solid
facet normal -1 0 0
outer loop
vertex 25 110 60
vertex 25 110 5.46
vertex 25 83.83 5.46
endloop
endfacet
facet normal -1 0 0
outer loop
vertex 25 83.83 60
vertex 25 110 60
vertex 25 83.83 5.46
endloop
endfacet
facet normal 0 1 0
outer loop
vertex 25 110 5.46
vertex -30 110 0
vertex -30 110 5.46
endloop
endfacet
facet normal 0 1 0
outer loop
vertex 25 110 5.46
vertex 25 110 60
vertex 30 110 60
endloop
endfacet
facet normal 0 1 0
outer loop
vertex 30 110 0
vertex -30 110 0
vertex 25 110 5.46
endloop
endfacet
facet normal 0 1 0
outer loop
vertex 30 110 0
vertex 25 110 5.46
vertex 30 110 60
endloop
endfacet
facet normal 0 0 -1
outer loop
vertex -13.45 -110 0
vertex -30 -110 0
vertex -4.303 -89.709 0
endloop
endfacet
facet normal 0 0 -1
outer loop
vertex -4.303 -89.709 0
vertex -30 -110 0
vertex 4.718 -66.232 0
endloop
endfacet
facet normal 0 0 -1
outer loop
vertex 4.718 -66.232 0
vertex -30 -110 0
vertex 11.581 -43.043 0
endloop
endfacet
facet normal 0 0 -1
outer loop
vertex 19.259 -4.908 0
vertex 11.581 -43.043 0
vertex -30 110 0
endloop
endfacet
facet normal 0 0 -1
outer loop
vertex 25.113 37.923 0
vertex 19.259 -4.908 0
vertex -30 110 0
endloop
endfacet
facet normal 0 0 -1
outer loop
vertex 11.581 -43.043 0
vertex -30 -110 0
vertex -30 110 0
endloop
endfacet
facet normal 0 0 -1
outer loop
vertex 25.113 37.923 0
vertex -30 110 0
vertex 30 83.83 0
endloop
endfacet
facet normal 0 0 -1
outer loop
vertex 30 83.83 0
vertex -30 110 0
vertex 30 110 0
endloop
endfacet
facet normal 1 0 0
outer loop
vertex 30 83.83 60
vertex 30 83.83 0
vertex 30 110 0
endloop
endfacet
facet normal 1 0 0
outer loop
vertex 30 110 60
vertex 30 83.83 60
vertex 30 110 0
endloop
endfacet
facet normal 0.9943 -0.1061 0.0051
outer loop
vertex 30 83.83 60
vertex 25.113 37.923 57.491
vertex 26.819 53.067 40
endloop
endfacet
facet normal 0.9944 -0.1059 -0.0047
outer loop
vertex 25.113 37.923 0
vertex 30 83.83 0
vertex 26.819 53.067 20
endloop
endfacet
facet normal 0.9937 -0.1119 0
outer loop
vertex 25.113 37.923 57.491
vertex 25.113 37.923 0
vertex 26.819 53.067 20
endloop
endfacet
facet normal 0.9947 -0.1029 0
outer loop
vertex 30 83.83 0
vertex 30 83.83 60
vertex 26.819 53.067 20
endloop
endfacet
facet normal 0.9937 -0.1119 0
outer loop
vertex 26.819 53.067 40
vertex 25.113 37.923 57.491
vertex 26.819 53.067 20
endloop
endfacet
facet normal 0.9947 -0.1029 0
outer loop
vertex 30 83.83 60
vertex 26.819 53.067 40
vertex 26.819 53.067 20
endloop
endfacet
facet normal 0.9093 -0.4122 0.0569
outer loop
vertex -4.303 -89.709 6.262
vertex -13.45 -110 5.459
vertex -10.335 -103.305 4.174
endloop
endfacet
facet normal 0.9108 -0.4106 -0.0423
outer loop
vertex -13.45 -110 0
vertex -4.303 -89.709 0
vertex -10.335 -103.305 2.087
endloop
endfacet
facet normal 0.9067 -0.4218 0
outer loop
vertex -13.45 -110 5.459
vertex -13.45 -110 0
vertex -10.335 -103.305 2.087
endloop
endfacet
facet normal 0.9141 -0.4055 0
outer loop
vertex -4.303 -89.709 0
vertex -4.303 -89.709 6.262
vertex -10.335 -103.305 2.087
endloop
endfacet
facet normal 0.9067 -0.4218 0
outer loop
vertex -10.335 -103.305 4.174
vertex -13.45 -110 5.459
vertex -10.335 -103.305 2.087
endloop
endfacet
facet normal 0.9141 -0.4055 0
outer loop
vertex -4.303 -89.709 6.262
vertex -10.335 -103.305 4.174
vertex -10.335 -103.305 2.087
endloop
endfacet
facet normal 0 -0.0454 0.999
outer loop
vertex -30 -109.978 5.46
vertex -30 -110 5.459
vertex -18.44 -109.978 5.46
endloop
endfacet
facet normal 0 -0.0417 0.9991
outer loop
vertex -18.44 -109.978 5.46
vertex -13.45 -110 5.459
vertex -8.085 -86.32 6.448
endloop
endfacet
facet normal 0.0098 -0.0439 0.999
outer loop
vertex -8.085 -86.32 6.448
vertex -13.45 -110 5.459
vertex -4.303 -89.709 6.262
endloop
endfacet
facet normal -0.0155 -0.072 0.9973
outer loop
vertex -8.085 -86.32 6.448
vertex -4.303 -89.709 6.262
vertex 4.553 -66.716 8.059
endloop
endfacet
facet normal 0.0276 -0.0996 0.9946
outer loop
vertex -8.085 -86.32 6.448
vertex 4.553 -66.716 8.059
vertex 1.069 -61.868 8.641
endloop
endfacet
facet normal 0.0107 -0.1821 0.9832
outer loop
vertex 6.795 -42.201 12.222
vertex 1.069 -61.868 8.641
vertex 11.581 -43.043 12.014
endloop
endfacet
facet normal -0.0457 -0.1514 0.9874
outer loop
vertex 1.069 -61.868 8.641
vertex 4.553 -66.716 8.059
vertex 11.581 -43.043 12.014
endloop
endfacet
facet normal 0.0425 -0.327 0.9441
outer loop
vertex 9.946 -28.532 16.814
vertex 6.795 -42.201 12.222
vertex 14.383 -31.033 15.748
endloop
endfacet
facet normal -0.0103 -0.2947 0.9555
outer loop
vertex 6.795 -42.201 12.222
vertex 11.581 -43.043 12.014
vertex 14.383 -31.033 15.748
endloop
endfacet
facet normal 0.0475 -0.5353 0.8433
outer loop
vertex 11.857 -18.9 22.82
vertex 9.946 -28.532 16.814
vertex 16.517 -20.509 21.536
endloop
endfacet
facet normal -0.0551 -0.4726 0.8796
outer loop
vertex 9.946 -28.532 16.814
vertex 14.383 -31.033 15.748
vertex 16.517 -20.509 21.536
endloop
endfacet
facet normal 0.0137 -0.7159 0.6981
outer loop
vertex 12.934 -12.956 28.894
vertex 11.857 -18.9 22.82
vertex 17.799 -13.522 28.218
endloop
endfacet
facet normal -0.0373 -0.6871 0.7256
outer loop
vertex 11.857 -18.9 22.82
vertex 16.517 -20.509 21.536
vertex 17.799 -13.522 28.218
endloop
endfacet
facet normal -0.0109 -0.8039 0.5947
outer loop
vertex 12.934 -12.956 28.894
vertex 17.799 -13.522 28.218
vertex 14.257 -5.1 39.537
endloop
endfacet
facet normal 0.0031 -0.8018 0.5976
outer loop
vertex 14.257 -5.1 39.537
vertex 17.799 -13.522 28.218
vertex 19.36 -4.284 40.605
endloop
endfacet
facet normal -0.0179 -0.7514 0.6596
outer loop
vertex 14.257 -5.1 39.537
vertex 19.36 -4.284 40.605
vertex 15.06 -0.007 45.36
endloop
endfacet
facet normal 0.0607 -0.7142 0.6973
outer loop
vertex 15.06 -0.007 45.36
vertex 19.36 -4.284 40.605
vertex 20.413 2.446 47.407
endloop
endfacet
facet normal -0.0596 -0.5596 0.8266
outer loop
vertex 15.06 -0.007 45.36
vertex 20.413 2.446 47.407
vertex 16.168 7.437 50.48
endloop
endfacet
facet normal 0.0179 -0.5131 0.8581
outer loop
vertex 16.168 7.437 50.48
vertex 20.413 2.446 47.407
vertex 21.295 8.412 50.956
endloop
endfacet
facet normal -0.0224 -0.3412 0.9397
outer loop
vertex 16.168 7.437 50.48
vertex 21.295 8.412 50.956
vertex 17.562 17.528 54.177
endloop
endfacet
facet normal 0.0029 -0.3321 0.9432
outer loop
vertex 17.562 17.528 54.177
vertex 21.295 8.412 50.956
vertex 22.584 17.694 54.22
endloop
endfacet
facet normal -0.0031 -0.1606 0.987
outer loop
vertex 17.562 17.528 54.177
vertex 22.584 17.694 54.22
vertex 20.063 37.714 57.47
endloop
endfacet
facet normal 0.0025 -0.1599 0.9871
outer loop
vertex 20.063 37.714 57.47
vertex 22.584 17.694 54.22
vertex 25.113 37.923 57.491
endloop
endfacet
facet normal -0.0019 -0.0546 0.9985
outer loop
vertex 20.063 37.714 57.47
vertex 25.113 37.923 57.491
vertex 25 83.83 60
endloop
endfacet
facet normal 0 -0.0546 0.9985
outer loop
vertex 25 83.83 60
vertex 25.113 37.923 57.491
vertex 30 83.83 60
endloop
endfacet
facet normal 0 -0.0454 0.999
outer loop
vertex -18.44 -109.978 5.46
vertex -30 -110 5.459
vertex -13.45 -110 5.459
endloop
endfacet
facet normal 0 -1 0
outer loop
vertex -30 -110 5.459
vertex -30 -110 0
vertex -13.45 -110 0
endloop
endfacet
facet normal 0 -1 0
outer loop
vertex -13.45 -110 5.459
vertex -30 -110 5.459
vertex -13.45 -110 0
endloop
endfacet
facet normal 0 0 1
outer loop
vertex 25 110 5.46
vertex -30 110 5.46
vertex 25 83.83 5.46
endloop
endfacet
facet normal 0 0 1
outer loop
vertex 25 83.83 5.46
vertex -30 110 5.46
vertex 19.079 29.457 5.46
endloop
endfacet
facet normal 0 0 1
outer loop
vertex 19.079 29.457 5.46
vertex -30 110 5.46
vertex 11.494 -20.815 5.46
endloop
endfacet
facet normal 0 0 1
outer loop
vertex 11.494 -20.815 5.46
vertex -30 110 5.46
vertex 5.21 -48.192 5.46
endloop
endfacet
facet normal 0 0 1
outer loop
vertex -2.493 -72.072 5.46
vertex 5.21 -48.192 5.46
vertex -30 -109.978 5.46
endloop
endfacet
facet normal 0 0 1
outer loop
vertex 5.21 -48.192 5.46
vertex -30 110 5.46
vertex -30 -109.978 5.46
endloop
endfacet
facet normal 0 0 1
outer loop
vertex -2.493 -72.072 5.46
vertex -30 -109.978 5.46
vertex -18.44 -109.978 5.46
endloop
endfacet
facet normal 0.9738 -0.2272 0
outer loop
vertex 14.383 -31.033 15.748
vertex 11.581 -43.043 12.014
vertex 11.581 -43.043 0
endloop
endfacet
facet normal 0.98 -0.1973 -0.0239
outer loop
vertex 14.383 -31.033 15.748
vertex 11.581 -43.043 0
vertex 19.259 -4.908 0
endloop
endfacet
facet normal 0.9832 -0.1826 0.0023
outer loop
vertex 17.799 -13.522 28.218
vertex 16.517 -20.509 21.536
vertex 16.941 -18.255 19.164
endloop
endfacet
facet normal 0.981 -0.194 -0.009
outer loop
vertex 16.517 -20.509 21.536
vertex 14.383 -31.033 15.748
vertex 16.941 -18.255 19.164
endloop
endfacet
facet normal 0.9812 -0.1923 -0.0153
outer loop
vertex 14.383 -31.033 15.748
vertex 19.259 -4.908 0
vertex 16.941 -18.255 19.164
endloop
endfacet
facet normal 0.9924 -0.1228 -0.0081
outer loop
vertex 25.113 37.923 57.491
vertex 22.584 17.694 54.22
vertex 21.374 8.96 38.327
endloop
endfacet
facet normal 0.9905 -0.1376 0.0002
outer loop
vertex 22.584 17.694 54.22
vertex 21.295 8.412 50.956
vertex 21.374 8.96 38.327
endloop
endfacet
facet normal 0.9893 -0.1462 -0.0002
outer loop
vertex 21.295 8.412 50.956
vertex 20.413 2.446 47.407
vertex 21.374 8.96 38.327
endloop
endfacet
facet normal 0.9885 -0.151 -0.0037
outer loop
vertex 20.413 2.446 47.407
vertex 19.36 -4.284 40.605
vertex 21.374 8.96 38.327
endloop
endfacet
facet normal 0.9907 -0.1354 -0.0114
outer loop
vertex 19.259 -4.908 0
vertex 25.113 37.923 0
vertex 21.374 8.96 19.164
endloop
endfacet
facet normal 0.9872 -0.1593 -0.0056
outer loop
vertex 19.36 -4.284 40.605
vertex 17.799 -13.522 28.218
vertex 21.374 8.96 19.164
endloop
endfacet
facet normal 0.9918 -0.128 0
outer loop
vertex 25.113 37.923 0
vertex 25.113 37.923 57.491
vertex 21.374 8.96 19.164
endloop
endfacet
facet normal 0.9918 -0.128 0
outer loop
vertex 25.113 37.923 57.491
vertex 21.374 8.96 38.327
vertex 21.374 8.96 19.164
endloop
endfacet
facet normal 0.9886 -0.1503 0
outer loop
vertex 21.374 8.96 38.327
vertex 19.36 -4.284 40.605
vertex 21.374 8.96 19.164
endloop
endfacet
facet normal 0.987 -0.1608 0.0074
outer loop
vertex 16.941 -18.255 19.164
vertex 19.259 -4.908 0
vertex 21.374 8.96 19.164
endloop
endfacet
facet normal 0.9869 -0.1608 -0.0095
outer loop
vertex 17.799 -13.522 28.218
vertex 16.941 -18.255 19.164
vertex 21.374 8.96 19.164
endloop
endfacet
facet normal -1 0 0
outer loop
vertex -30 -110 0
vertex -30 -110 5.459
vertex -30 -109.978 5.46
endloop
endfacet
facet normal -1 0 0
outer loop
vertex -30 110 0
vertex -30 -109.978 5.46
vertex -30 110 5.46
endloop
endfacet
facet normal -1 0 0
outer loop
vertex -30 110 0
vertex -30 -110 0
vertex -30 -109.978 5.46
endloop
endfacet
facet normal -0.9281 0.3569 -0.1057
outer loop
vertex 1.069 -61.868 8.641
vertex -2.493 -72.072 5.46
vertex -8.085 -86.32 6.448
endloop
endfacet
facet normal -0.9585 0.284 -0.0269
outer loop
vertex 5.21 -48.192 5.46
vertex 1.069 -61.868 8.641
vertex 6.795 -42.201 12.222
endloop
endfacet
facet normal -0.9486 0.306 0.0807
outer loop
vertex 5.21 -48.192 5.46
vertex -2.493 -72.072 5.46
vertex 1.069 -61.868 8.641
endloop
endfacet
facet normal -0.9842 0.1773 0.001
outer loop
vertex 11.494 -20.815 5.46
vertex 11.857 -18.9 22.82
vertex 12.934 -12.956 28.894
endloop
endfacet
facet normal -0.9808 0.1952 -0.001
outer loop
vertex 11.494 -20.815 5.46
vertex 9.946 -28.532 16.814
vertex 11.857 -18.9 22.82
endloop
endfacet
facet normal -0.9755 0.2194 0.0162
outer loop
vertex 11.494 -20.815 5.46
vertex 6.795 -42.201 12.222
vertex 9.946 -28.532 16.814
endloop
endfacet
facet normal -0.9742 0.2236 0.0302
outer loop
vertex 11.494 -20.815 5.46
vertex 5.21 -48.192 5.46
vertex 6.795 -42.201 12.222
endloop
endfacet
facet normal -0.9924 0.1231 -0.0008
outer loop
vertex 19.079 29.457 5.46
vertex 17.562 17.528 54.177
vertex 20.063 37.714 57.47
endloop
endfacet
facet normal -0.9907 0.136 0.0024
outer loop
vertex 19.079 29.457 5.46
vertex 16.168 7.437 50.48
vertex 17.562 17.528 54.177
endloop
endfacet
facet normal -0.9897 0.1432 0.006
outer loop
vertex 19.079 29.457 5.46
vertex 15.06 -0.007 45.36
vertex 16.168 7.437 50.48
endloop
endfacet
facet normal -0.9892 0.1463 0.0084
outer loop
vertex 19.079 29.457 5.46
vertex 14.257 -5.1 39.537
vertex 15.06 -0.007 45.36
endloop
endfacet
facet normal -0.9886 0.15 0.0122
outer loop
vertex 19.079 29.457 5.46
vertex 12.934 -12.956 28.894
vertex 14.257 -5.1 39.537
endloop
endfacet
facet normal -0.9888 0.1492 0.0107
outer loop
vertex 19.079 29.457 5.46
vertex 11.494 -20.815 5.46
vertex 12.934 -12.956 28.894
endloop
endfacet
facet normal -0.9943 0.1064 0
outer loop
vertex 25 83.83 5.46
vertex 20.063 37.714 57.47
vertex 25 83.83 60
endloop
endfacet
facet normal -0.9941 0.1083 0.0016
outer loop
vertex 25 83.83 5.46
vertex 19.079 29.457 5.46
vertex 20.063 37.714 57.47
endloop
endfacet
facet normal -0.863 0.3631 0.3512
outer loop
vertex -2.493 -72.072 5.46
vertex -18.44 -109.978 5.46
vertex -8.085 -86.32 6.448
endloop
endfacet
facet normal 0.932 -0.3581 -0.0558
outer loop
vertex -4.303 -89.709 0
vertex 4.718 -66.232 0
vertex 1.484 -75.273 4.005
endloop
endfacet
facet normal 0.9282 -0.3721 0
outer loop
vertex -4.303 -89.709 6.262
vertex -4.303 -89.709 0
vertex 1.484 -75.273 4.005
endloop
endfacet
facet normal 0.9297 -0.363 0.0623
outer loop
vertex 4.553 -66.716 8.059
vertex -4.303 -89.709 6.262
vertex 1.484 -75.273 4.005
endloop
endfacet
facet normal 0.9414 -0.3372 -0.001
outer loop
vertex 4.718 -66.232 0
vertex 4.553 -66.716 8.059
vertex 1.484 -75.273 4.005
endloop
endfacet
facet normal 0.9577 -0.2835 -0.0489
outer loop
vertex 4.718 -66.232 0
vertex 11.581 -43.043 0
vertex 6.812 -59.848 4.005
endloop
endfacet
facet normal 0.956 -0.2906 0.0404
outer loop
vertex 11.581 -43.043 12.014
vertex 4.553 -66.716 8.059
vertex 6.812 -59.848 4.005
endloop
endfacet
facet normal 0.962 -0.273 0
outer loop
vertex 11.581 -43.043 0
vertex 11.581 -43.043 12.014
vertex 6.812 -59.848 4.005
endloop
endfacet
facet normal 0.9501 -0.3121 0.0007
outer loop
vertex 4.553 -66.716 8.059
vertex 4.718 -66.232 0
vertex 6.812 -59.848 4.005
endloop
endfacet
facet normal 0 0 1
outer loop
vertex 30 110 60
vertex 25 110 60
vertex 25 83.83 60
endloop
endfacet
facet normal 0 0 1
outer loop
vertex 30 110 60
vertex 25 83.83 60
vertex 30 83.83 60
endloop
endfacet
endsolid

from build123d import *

# Parameters (mm, degrees)
F0_W     = 60
F0_H     = 220
F1_DEPTH = 60
F3_DEPTH = 60.001
F5_DEPTH = 60.0010001
F6_START = -5.46
F4_W     = 55
F4_H     = 26.17
F6_DEPTH = 74.54


with BuildPart() as f1:
    # F0 (on Top) → F1 (new body)
    with BuildSketch(Plane.XY):
        Rectangle(F0_W, F0_H)
    extrude(amount=F1_DEPTH)

    # F2 (on face) → F3 (cut, through all)
    with BuildSketch(Plane.YZ.offset(30)):
        with BuildLine():
            Line((-110, 60), (-110, 5.4592178203))
            add(Edge.make_bspline(
                [(-110, 5.4592178203), (-88.3301750343, 6.2141776062), (-17.4415363661, 7.8038979975), (-2.4796110185, 55.9141440318), (34.855034512, 58.1974692918), (83.83, 60)],
                knots=[0, 0, 0, 0, 0.3774214734, 0.6243161477, 1, 1, 1, 1], degree=3))
            Line((83.83, 60), (-110, 60))
        make_face()
    extrude(amount=-F3_DEPTH, mode=Mode.SUBTRACT)

    # F4 (on face) → F5 (cut, through all)
    with BuildSketch(Plane(origin=(0, 0, 0), x_dir=(1, 0, 0), z_dir=(0, 0, -1))):
        with BuildLine():
            add(Edge.make_bspline(
                [(25.1129814899, -37.9226556811), (26.8734855483, -52.9443126868), (28.4566374792, -68.3794013283), (30, -83.83)],
                knots=[0.8073169996, 0.8073169996, 0.8073169996, 0.8073169996, 1, 1, 1, 1], degree=3))
            Line((30, -83.83), (30, 110))
            Line((30, 110), (-13.4503107729, 110))
            add(Edge.make_bspline(
                [(-13.4503107729, 110), (-10.3085935059, 103.3156568841), (-7.2413287965, 96.6211419831), (-4.3029165498, 89.709023616)],
                knots=[0, 0, 0, 0, 0.1408268689, 0.1408268689, 0.1408268689, 0.1408268689], degree=3))
            add(Edge.make_bspline(
                [(-4.3029165498, 89.709023616), (1.6785085714, 75.6387315772), (7.1260131715, 60.666765223), (11.5807438269, 43.0434755981)],
                knots=[0.1408268689, 0.1408268689, 0.1408268689, 0.1408268689, 0.4274937151, 0.4274937151, 0.4274937151, 0.4274937151], degree=3))
            add(Edge.make_bspline(
                [(11.5807438269, 43.0434755981), (17.4831020937, 19.6932492321), (21.6426160071, -8.3114544361), (25.1129814899, -37.9226556811)],
                knots=[0.4274937151, 0.4274937151, 0.4274937151, 0.4274937151, 0.8073169996, 0.8073169996, 0.8073169996, 0.8073169996], degree=3))
        make_face()
    extrude(amount=-F5_DEPTH, mode=Mode.SUBTRACT)

    # F4 (on face) → F6 (cut)
    with BuildSketch(Plane(origin=(0, 0, 0), x_dir=(1, 0, 0), z_dir=(0, 0, -1)).offset(F6_START)):
        with BuildLine():
            Line((-30, -83.83), (25, -83.83))
            add(Edge.make_bspline(
                [(6.5807438269, 43.0434755981), (15.6026307937, 7.8522057541), (20.3013153969, -37.988897123), (25, -83.83)],
                knots=[0.4274937151, 0.4274937151, 0.4274937151, 0.4274937151, 1, 1, 1, 1], degree=3))
            add(Edge.make_bspline(
                [(-18.4503107729, 110), (-9.3031307537, 89.6604989609), (-0.1559507346, 69.3209979217), (6.5807438269, 43.0434755981)],
                knots=[0, 0, 0, 0, 0.4274937151, 0.4274937151, 0.4274937151, 0.4274937151], degree=3))
            Line((-18.4503107729, 110), (-30, 110))
            Line((-30, 110), (-30, -83.83))
        make_face()
        with Locations((-2.5, -96.915)):
            Rectangle(F4_W, F4_H)
    extrude(amount=-F6_DEPTH, mode=Mode.SUBTRACT)


solid = f1.part
